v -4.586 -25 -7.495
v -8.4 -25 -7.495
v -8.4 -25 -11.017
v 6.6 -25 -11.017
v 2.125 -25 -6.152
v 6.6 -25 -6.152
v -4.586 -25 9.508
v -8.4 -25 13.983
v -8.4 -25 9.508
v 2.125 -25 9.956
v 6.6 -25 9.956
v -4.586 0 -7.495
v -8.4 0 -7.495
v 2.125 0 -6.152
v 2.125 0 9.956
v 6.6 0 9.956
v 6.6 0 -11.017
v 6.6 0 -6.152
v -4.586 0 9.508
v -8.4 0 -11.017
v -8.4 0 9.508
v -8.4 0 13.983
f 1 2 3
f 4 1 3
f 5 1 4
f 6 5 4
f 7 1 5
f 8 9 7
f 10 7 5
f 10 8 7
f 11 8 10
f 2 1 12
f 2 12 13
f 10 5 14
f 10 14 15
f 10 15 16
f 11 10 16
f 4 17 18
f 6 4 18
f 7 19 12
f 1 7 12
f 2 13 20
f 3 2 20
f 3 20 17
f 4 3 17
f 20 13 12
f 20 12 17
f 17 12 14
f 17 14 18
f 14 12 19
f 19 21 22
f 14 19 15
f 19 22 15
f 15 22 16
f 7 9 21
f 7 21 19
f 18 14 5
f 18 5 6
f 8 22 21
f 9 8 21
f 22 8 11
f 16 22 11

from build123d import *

# Parameters (mm, degrees)
F0_W     = 3.813922
F0_H     = 17.002841
F0_W_2   = 4.474432
F0_H_2   = 16.107955
F1_DEPTH = 25
F2_DEPTH = 25.001
F3_DEPTH = 46


with BuildPart() as f1:
    # F0 (on Front) → F1 (new body)
    with BuildSketch(Plane.XZ):
        Polygon((6.599786, 9.955611), (-8.400214, 13.9826), (-8.400214, 9.508167), (-4.586292, 9.508167), (-4.586292, -7.494674), (-8.400214, -7.494674), (-8.400214, -11.0174), (6.599786, -11.0174), (6.599786, -6.152344), (2.125354, -6.152344), (2.125354, 9.955611), align=None)
        Polygon((6.599786, 13.9826), (-8.400214, 13.9826), (6.599786, 9.955611), align=None)
        with Locations((-6.493253, 1.006747)):
            Rectangle(F0_W, F0_H)
        with Locations((4.36257, 1.901633)):
            Rectangle(F0_W_2, F0_H_2)
    extrude(amount=F1_DEPTH)

    # F0 (on Front) → F2 (cut, through all)
    with BuildSketch(Plane.XZ):
        with Locations((4.36257, 1.901633)):
            Rectangle(F0_W_2, F0_H_2)
        with Locations((-6.493253, 1.006747)):
            Rectangle(F0_W, F0_H)
    extrude(amount=F2_DEPTH, mode=Mode.SUBTRACT)

    # F0 (on Front) → F3 (cut)
    with BuildSketch(Plane.XZ):
        Polygon((6.599786, 13.9826), (-8.400214, 13.9826), (6.599786, 9.955611), align=None)
    extrude(amount=F3_DEPTH, mode=Mode.SUBTRACT)


solid = f1.part
